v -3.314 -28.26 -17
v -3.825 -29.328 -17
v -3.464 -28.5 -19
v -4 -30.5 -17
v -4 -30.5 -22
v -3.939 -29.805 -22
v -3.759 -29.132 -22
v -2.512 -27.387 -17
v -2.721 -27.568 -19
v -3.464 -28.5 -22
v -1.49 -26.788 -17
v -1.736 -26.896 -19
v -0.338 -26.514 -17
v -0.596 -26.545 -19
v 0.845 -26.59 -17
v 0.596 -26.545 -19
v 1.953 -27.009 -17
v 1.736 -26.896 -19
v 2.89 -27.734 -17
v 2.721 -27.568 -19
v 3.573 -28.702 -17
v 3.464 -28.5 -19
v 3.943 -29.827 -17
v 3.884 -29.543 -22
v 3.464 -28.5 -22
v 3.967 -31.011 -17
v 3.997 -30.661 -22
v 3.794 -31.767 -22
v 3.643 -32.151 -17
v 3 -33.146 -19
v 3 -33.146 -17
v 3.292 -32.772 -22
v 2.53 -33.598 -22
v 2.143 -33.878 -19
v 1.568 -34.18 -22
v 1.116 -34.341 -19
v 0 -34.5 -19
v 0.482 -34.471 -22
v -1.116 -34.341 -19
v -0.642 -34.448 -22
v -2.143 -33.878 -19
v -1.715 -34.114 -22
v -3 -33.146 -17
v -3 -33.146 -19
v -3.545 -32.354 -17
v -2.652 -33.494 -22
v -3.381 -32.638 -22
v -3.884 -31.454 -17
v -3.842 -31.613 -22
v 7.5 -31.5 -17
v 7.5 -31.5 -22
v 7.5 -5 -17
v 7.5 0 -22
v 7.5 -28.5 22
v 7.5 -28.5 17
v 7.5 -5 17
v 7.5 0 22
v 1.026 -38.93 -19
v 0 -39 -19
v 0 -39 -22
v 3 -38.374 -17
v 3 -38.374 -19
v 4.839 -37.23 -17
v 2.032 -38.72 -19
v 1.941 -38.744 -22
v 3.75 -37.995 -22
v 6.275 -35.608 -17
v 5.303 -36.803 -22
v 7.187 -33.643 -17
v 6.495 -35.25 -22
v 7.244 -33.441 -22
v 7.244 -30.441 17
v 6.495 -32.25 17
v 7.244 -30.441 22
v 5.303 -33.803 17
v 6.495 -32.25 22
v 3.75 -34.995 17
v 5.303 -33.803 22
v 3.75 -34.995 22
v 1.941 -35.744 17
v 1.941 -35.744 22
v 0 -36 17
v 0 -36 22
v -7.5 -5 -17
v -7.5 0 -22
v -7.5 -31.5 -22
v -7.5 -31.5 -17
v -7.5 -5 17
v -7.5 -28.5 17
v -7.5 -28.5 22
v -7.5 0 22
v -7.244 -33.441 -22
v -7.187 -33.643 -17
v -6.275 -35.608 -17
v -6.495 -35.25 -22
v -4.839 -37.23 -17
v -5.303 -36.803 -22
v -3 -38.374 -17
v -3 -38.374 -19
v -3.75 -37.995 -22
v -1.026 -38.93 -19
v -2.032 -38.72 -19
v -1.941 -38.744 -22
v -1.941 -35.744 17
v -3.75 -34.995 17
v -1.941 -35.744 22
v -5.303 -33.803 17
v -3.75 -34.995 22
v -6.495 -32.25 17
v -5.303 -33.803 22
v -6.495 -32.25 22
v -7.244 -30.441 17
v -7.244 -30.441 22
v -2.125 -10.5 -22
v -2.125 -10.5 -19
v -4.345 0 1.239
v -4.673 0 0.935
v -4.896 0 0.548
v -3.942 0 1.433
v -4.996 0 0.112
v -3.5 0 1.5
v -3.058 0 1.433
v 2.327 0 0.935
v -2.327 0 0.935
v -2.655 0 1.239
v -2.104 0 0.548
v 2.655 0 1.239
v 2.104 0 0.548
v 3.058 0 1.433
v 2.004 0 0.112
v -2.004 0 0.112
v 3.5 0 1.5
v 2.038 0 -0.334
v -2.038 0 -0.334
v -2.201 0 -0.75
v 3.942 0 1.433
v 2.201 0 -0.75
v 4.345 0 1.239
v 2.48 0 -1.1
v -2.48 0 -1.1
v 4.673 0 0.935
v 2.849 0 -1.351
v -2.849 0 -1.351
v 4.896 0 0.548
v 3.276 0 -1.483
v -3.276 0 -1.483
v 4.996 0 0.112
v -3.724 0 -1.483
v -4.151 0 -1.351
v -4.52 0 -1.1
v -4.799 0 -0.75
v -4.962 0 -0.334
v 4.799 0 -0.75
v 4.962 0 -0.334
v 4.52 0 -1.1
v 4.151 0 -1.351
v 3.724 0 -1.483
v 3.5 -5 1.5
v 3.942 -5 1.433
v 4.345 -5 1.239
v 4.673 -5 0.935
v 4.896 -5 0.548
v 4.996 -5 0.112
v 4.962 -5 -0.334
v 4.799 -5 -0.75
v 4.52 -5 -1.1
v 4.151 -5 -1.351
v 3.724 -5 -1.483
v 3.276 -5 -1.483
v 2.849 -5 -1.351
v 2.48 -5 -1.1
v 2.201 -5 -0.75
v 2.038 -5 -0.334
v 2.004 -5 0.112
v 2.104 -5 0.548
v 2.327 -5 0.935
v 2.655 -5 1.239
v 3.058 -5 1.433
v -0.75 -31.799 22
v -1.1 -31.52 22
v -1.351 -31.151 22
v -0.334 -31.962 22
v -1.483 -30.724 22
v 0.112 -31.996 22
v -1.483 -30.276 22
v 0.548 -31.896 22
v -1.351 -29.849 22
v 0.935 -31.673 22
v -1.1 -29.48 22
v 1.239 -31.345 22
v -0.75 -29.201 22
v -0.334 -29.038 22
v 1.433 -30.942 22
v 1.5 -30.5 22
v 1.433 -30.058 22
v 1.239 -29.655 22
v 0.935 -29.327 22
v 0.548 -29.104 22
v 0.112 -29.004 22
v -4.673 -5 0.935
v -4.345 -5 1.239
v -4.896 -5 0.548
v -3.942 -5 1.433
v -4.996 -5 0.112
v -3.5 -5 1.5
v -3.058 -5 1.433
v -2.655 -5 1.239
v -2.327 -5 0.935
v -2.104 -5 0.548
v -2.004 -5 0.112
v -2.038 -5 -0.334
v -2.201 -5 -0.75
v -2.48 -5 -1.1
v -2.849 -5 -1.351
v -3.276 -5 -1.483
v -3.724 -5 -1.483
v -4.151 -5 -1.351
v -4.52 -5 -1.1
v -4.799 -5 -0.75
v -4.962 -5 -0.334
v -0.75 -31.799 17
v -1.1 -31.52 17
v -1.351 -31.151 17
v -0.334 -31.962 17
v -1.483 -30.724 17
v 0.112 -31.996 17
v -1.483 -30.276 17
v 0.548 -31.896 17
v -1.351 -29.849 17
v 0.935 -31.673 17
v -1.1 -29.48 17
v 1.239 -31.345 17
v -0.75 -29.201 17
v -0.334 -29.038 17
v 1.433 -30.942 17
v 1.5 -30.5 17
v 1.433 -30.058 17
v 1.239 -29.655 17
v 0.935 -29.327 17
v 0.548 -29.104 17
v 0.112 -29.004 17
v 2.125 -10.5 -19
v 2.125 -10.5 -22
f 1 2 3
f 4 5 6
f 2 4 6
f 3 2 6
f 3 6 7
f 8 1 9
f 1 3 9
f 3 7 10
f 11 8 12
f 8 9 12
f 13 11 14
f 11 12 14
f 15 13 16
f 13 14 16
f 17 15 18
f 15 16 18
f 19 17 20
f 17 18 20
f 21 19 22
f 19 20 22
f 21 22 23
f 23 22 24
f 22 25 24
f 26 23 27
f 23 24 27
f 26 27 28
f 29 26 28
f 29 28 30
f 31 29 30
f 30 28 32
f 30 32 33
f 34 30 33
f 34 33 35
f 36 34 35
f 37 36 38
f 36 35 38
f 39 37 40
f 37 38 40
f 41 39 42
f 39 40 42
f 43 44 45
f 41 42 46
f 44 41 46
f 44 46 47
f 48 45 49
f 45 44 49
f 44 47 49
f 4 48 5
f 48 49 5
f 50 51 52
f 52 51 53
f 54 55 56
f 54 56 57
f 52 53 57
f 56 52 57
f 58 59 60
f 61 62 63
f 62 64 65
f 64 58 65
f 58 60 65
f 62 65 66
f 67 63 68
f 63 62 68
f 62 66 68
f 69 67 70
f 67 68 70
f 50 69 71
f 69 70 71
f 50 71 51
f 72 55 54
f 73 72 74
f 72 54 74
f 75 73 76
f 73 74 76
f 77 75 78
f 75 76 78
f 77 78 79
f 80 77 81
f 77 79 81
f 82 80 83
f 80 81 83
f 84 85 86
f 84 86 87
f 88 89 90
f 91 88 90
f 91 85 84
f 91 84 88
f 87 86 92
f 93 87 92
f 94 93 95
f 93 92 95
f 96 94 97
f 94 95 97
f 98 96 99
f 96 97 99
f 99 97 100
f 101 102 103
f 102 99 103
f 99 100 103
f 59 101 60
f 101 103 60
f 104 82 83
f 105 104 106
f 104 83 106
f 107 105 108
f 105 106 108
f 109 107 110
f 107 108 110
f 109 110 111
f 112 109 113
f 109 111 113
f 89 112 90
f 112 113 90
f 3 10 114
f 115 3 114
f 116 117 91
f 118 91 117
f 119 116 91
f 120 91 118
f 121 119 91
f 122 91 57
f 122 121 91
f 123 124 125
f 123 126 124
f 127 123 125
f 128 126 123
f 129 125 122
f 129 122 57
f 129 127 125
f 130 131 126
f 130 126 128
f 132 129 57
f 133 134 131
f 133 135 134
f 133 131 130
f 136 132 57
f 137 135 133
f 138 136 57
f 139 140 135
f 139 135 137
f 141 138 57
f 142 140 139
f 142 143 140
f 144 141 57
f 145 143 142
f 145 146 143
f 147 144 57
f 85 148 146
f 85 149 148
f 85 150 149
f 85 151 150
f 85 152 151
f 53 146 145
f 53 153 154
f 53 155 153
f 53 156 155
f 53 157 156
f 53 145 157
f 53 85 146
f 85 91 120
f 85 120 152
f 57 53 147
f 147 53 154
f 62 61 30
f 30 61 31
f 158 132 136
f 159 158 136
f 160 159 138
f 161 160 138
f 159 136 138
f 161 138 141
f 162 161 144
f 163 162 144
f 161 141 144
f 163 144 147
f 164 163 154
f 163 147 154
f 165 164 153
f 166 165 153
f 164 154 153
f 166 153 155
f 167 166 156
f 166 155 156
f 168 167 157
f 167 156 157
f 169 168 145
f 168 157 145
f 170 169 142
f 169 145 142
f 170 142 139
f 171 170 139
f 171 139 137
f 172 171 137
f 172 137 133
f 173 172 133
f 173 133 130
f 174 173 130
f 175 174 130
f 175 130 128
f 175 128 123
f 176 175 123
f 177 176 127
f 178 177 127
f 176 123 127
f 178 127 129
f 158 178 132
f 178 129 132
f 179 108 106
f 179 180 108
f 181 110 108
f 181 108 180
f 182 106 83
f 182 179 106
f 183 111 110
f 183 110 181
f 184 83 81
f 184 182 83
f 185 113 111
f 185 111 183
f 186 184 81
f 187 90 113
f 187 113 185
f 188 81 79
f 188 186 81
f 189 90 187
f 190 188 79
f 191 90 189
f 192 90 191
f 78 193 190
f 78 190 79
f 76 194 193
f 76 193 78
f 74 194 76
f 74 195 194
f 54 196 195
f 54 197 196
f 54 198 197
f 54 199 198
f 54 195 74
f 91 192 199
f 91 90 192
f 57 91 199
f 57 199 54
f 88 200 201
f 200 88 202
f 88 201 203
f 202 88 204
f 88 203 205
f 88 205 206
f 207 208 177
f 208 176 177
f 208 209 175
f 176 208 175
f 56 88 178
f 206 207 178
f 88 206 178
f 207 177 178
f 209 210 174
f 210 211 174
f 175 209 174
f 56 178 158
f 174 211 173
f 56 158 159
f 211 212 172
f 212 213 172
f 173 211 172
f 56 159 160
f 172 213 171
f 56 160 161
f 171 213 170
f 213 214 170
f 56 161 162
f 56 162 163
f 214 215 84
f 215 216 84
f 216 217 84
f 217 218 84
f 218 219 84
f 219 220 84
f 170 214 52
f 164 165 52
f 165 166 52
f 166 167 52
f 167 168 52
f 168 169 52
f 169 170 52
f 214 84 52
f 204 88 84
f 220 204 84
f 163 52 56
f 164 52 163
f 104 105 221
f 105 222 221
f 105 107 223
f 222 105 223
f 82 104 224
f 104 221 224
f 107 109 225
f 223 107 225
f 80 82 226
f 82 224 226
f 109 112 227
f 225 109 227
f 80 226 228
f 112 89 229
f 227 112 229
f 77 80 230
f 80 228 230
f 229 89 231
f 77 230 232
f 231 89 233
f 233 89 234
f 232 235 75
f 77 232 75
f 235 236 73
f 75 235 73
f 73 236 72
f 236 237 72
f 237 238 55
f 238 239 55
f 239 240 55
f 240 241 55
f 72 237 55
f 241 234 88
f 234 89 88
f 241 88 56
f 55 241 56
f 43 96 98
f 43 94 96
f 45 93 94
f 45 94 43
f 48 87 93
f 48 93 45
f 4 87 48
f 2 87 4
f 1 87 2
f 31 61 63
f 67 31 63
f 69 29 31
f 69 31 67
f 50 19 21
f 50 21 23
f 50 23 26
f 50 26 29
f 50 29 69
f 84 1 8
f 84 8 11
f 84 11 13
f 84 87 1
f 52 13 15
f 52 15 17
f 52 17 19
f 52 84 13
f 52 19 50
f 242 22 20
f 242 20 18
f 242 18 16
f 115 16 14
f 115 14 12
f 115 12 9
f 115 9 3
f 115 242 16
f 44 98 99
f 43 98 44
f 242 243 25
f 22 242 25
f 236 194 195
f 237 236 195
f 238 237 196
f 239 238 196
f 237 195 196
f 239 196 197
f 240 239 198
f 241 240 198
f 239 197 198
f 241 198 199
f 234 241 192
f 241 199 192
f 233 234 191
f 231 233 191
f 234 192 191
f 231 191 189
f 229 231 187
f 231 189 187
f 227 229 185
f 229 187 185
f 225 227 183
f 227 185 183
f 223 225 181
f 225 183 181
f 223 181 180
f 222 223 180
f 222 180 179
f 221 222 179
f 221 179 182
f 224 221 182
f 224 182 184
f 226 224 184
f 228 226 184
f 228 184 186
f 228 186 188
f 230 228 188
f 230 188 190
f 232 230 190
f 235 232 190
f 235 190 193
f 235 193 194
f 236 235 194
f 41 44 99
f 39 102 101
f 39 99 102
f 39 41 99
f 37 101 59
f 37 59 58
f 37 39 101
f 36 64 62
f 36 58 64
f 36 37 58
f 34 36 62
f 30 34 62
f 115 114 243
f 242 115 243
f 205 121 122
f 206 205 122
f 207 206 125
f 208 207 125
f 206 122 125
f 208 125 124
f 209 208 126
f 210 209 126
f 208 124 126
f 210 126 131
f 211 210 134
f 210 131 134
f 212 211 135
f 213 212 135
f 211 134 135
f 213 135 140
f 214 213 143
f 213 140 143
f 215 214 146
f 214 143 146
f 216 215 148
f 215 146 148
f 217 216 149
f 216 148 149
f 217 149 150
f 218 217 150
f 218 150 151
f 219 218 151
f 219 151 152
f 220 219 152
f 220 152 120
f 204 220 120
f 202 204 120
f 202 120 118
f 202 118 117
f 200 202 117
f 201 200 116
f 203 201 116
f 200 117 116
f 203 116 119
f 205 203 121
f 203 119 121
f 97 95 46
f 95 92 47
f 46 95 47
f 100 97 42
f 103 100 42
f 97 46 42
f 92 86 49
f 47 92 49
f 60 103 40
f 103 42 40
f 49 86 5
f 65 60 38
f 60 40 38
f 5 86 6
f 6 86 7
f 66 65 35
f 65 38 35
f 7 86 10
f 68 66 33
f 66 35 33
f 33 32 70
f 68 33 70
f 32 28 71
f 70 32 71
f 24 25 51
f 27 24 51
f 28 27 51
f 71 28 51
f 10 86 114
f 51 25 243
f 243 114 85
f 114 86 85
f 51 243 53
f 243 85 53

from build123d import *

# Parameters (mm, degrees)
CROQUIS1_W              = 15
CROQUIS1_H              = 44
CROQUIS1_R              = 1.5
SALIENTE_EXTRUIR1_DEPTH = 5
CROQUIS2_W              = 15
CROQUIS2_H              = 5
SALIENTE_EXTRUIR2_DEPTH = 34
CROQUIS2_3_W            = 15
CROQUIS2_3_H            = 5
SALIENTE_EXTRUIR3_DEPTH = 31
CORTAR_EXTRUIR1_REACH   = 61.273
CROQUIS3_R              = 1.5
CORTAR_EXTRUIR2_REACH   = 61.273
CROQUIS4_R              = 4
CROQUIS5_W              = 6
CROQUIS5_H              = 5.854248689
CORTAR_EXTRUIR3_DEPTH   = 2
CORTAR_EXTRUIR4_DEPTH   = 3


with BuildPart() as part:
    # Croquis1 → Saliente-Extruir1 (new body)
    with BuildSketch(Plane(origin=(0, 0, 0), x_dir=(1, 0, 0), z_dir=(0, 1, 0))):
        Rectangle(CROQUIS1_W, CROQUIS1_H)
        with Locations((3.5, 0)):
            Circle(CROQUIS1_R, mode=Mode.SUBTRACT)
        with Locations((-3.5, 0)):
            Circle(CROQUIS1_R, mode=Mode.SUBTRACT)
    extrude(amount=-SALIENTE_EXTRUIR1_DEPTH)

    # Croquis2 → Saliente-Extruir2 (add)
    with BuildSketch(Plane.XZ.offset(5)):
        with Locations((0, -19.5)):
            Rectangle(CROQUIS2_W, CROQUIS2_H)
    extrude(amount=SALIENTE_EXTRUIR2_DEPTH)

    # Croquis2<3> → Saliente-Extruir3 (add)
    with BuildSketch(Plane.XZ.offset(5)):
        with Locations((0, 19.5)):
            Rectangle(CROQUIS2_3_W, CROQUIS2_3_H)
    extrude(amount=SALIENTE_EXTRUIR3_DEPTH)

    # Croquis3 → Cortar-Extruir1 (cut, up to next)
    with BuildSketch(Plane.XY.offset(22), mode=Mode.PRIVATE) as cortar_extruir1_sk1:
        with BuildLine():
            ThreePointArc((0, -36), (-5.303300859, -33.803300859), (-7.5, -28.5))
            Line((-7.5, -28.5), (-7.5, -36))
            Line((-7.5, -36), (0, -36))
        make_face()
    cortar_extruir1_tool1 = extrude(cortar_extruir1_sk1.sketch, amount=-CORTAR_EXTRUIR1_REACH, mode=Mode.PRIVATE) & part.part
    # Croquis3 → Cortar-Extruir1 (cut, up to next)
    with BuildSketch(Plane.XY.offset(22), mode=Mode.PRIVATE) as cortar_extruir1_sk2:
        with BuildLine():
            Line((7.5, -36), (7.5, -28.5))
            ThreePointArc((7.5, -28.5), (5.303300859, -33.803300859), (0, -36))
            Line((0, -36), (7.5, -36))
        make_face()
    cortar_extruir1_tool2 = extrude(cortar_extruir1_sk2.sketch, amount=-CORTAR_EXTRUIR1_REACH, mode=Mode.PRIVATE) & part.part
    # Croquis3 → Cortar-Extruir1 (cut, up to next)
    with BuildSketch(Plane.XY.offset(22), mode=Mode.PRIVATE) as cortar_extruir1_sk3:
        with Locations((0, -30.5)):
            Circle(CROQUIS3_R)
    cortar_extruir1_tool3 = extrude(cortar_extruir1_sk3.sketch, amount=-CORTAR_EXTRUIR1_REACH, mode=Mode.PRIVATE) & part.part
    add(cortar_extruir1_tool1.solids().sort_by_distance((-5.82474, -34.32474, 22))[0], mode=Mode.SUBTRACT)
    add(cortar_extruir1_tool2.solids().sort_by_distance((5.82474, -34.32474, 22))[0], mode=Mode.SUBTRACT)
    add(cortar_extruir1_tool3.solids().sort_by_distance((0, -30.5, 22))[0], mode=Mode.SUBTRACT)

    # Croquis4 → Cortar-Extruir2 (cut, up to next)
    with BuildSketch(Plane(origin=(0, 0, -22), x_dir=(-1, 0, 0), z_dir=(0, 0, -1)), mode=Mode.PRIVATE) as cortar_extruir2_sk1:
        with Locations((0, -30.5)):
            Circle(CROQUIS4_R)
    cortar_extruir2_tool1 = extrude(cortar_extruir2_sk1.sketch, amount=-CORTAR_EXTRUIR2_REACH, mode=Mode.PRIVATE) & part.part
    # Croquis4 → Cortar-Extruir2 (cut, up to next)
    with BuildSketch(Plane(origin=(0, 0, -22), x_dir=(-1, 0, 0), z_dir=(0, 0, -1)), mode=Mode.PRIVATE) as cortar_extruir2_sk2:
        with BuildLine():
            Line((7.5, -39), (7.5, -31.5))
            ThreePointArc((7.5, -31.5), (5.303300859, -36.803300859), (0, -39))
            Line((0, -39), (7.5, -39))
        make_face()
    cortar_extruir2_tool2 = extrude(cortar_extruir2_sk2.sketch, amount=-CORTAR_EXTRUIR2_REACH, mode=Mode.PRIVATE) & part.part
    # Croquis4 → Cortar-Extruir2 (cut, up to next)
    with BuildSketch(Plane(origin=(0, 0, -22), x_dir=(-1, 0, 0), z_dir=(0, 0, -1)), mode=Mode.PRIVATE) as cortar_extruir2_sk3:
        with BuildLine():
            ThreePointArc((0, -39), (-5.303300862, -36.803300856), (-7.5, -31.499999991))
            Line((-7.5, -31.499999991), (-7.5, -39))
            Line((-7.5, -39), (0, -39))
        make_face()
    cortar_extruir2_tool3 = extrude(cortar_extruir2_sk3.sketch, amount=-CORTAR_EXTRUIR2_REACH, mode=Mode.PRIVATE) & part.part
    add(cortar_extruir2_tool1.solids().sort_by_distance((0, -30.5, -22))[0], mode=Mode.SUBTRACT)
    add(cortar_extruir2_tool2.solids().sort_by_distance((-5.82474, -37.32474, -22))[0], mode=Mode.SUBTRACT)
    add(cortar_extruir2_tool3.solids().sort_by_distance((5.82474, -37.32474, -22))[0], mode=Mode.SUBTRACT)

    # Croquis5 → Cortar-Extruir3 (cut)
    with BuildSketch(Plane.XY.offset(-17)):
        with Locations((0, -36.072875655)):
            Rectangle(CROQUIS5_W, CROQUIS5_H)
    extrude(amount=-CORTAR_EXTRUIR3_DEPTH, mode=Mode.SUBTRACT)

    # Croquis6 → Cortar-Extruir4 (cut)
    with BuildSketch(Plane(origin=(0, 0, -22), x_dir=(-1, 0, 0), z_dir=(0, 0, -1))):
        with BuildLine():
            Line((2.125, -10.5), (-2.125, -10.5))
            Line((-2.125, -10.5), (-3.464101615, -28.5))
            ThreePointArc((-3.464101615, -28.5), (0, -26.5), (3.464101615, -28.5))
            Line((3.464101615, -28.5), (2.125, -10.5))
        make_face()
    extrude(amount=-CORTAR_EXTRUIR4_DEPTH, mode=Mode.SUBTRACT)


solid = part.part
